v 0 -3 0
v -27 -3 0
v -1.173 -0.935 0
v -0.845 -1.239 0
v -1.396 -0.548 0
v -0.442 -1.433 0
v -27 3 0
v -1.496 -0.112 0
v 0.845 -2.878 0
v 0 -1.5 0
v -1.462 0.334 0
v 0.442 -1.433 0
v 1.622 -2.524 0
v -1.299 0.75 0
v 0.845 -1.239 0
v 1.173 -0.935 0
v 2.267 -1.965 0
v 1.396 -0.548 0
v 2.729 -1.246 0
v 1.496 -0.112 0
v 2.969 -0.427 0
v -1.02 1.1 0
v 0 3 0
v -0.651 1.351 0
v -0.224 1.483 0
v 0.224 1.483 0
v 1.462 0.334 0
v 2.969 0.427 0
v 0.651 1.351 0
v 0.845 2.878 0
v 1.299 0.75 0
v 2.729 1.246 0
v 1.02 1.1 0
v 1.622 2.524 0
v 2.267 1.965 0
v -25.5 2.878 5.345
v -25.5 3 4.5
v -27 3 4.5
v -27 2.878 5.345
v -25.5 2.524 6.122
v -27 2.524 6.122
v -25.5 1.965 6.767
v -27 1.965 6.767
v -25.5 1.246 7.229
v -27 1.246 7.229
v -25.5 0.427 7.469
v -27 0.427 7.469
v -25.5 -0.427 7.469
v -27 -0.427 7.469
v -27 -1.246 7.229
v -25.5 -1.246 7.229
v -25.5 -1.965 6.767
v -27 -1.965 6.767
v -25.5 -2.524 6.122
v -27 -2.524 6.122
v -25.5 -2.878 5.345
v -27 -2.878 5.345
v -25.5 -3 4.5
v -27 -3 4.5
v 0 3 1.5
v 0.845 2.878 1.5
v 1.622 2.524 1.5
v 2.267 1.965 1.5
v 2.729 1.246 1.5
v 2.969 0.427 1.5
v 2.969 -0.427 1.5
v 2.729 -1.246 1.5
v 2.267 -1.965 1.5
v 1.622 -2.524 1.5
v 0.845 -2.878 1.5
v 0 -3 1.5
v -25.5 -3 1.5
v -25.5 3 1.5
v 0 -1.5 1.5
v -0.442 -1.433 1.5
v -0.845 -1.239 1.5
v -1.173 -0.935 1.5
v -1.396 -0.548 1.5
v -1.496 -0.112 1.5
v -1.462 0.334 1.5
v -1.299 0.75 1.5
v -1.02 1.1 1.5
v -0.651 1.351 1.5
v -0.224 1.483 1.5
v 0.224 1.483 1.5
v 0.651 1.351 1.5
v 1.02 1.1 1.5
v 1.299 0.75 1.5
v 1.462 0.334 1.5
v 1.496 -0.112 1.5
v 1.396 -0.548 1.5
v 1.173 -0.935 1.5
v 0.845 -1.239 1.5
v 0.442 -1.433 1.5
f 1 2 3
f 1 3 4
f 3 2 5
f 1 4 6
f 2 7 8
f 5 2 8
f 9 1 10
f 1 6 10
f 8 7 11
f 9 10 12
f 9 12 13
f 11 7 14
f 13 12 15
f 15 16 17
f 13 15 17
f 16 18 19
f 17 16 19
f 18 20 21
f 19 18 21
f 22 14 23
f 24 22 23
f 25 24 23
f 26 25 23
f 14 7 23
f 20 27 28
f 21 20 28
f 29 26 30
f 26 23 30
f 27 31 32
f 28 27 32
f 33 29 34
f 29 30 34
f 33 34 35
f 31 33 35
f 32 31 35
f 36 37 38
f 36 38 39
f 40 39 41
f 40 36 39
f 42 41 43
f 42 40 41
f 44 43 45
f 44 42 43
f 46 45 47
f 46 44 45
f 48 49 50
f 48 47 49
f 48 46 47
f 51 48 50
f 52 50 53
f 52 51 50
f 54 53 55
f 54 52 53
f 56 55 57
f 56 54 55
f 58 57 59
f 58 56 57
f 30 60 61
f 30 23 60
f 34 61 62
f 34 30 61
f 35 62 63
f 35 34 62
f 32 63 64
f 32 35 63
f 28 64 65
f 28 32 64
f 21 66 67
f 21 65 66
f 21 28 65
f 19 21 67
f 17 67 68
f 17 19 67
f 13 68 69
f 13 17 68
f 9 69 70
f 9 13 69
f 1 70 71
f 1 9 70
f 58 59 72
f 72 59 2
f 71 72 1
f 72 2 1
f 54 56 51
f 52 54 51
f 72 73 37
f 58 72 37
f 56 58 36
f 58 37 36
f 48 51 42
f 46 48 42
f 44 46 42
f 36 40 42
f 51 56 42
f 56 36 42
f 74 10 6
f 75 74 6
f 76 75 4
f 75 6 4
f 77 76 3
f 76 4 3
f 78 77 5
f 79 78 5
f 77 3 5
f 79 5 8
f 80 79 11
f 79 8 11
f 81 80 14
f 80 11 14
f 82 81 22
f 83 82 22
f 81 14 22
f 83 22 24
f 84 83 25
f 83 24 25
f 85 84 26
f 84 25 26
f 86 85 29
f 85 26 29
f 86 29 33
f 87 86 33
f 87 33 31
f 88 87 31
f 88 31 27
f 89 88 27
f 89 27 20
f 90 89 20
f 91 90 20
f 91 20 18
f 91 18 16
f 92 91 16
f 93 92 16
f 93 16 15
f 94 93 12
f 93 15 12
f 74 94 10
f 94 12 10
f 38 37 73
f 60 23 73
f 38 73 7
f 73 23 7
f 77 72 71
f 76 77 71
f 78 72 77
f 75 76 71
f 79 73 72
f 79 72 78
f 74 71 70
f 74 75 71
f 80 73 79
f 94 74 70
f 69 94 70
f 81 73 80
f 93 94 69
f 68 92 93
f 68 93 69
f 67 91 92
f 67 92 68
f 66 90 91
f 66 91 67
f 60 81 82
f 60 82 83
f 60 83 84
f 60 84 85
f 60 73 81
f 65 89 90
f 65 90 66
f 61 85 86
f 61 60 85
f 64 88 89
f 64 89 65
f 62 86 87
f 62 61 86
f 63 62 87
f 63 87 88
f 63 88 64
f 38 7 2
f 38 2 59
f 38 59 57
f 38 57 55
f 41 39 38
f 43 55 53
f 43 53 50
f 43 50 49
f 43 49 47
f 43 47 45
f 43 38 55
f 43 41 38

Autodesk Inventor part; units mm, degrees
ref_plane "YZ Plane" through (0, 0, 0) normal (1, 0, 0) x (0, 1, 0)
ref_plane "XZ Plane" through (0, 0, 0) normal (0, 1, 0) x (-1, 0, 0)
ref_plane "XY Plane" through (0, 0, 0) normal (0, 0, 1) x (1, 0, 0)
sketch "Skizze1" plane through (0, 0, 0) normal (0, 0, 1) x (1, 0, 0)
  arc A0 (0, -3) -> (0, 3) centre (0, 0) ccw
  line L0 (0, 3) -> (-25.5, 3)
  line L1 (-25.5, 3) -> (-25.5, -3)
  line L2 (-25.5, -3) -> (0, -3)
  dimension "d0" = 3
  dimension "d1" = 25.5
extrude "Extrusion1" add sketch "Skizze1" along normal blind 1.5
sketch "Skizze3" plane through (-25.5, -3, 0) normal (-1, 0, 0) x (0, 0, 1)
  line L0 (0, 6) -> (0, 0) projected
  line L1 (0, 0) -> (1.5, 0) projected
  line L2 (1.5, 6) -> (1.5, 0) projected
  line L3 (0, 6) -> (1.5, 6) projected
  line L4 (0, 6) -> (4.5, 6)
  arc A0 (4.5, 0) -> (4.5, 6) centre (4.5, 3) ccw
  line L5 (4.5, 0) -> (0, 0)
  point P0 (0, 3)
  point P1 (7.5, 3)
  dimension "d4" = 7.5
extrude "Extrusion2" add sketch "Skizze3" along normal blind 1.5
sketch "Skizze4" plane through (0, 0, 1.5) normal (0, 0, 1) x (1, 0, 0)
  arc A0 (0, -3) -> (0, 3) centre (0, 0) ccw projected
hole "Bohrung1" at (0, 0, 1.5) direction (0, 0, -1) diameter 3 depth 1.5
properties part number "1 part 11"
